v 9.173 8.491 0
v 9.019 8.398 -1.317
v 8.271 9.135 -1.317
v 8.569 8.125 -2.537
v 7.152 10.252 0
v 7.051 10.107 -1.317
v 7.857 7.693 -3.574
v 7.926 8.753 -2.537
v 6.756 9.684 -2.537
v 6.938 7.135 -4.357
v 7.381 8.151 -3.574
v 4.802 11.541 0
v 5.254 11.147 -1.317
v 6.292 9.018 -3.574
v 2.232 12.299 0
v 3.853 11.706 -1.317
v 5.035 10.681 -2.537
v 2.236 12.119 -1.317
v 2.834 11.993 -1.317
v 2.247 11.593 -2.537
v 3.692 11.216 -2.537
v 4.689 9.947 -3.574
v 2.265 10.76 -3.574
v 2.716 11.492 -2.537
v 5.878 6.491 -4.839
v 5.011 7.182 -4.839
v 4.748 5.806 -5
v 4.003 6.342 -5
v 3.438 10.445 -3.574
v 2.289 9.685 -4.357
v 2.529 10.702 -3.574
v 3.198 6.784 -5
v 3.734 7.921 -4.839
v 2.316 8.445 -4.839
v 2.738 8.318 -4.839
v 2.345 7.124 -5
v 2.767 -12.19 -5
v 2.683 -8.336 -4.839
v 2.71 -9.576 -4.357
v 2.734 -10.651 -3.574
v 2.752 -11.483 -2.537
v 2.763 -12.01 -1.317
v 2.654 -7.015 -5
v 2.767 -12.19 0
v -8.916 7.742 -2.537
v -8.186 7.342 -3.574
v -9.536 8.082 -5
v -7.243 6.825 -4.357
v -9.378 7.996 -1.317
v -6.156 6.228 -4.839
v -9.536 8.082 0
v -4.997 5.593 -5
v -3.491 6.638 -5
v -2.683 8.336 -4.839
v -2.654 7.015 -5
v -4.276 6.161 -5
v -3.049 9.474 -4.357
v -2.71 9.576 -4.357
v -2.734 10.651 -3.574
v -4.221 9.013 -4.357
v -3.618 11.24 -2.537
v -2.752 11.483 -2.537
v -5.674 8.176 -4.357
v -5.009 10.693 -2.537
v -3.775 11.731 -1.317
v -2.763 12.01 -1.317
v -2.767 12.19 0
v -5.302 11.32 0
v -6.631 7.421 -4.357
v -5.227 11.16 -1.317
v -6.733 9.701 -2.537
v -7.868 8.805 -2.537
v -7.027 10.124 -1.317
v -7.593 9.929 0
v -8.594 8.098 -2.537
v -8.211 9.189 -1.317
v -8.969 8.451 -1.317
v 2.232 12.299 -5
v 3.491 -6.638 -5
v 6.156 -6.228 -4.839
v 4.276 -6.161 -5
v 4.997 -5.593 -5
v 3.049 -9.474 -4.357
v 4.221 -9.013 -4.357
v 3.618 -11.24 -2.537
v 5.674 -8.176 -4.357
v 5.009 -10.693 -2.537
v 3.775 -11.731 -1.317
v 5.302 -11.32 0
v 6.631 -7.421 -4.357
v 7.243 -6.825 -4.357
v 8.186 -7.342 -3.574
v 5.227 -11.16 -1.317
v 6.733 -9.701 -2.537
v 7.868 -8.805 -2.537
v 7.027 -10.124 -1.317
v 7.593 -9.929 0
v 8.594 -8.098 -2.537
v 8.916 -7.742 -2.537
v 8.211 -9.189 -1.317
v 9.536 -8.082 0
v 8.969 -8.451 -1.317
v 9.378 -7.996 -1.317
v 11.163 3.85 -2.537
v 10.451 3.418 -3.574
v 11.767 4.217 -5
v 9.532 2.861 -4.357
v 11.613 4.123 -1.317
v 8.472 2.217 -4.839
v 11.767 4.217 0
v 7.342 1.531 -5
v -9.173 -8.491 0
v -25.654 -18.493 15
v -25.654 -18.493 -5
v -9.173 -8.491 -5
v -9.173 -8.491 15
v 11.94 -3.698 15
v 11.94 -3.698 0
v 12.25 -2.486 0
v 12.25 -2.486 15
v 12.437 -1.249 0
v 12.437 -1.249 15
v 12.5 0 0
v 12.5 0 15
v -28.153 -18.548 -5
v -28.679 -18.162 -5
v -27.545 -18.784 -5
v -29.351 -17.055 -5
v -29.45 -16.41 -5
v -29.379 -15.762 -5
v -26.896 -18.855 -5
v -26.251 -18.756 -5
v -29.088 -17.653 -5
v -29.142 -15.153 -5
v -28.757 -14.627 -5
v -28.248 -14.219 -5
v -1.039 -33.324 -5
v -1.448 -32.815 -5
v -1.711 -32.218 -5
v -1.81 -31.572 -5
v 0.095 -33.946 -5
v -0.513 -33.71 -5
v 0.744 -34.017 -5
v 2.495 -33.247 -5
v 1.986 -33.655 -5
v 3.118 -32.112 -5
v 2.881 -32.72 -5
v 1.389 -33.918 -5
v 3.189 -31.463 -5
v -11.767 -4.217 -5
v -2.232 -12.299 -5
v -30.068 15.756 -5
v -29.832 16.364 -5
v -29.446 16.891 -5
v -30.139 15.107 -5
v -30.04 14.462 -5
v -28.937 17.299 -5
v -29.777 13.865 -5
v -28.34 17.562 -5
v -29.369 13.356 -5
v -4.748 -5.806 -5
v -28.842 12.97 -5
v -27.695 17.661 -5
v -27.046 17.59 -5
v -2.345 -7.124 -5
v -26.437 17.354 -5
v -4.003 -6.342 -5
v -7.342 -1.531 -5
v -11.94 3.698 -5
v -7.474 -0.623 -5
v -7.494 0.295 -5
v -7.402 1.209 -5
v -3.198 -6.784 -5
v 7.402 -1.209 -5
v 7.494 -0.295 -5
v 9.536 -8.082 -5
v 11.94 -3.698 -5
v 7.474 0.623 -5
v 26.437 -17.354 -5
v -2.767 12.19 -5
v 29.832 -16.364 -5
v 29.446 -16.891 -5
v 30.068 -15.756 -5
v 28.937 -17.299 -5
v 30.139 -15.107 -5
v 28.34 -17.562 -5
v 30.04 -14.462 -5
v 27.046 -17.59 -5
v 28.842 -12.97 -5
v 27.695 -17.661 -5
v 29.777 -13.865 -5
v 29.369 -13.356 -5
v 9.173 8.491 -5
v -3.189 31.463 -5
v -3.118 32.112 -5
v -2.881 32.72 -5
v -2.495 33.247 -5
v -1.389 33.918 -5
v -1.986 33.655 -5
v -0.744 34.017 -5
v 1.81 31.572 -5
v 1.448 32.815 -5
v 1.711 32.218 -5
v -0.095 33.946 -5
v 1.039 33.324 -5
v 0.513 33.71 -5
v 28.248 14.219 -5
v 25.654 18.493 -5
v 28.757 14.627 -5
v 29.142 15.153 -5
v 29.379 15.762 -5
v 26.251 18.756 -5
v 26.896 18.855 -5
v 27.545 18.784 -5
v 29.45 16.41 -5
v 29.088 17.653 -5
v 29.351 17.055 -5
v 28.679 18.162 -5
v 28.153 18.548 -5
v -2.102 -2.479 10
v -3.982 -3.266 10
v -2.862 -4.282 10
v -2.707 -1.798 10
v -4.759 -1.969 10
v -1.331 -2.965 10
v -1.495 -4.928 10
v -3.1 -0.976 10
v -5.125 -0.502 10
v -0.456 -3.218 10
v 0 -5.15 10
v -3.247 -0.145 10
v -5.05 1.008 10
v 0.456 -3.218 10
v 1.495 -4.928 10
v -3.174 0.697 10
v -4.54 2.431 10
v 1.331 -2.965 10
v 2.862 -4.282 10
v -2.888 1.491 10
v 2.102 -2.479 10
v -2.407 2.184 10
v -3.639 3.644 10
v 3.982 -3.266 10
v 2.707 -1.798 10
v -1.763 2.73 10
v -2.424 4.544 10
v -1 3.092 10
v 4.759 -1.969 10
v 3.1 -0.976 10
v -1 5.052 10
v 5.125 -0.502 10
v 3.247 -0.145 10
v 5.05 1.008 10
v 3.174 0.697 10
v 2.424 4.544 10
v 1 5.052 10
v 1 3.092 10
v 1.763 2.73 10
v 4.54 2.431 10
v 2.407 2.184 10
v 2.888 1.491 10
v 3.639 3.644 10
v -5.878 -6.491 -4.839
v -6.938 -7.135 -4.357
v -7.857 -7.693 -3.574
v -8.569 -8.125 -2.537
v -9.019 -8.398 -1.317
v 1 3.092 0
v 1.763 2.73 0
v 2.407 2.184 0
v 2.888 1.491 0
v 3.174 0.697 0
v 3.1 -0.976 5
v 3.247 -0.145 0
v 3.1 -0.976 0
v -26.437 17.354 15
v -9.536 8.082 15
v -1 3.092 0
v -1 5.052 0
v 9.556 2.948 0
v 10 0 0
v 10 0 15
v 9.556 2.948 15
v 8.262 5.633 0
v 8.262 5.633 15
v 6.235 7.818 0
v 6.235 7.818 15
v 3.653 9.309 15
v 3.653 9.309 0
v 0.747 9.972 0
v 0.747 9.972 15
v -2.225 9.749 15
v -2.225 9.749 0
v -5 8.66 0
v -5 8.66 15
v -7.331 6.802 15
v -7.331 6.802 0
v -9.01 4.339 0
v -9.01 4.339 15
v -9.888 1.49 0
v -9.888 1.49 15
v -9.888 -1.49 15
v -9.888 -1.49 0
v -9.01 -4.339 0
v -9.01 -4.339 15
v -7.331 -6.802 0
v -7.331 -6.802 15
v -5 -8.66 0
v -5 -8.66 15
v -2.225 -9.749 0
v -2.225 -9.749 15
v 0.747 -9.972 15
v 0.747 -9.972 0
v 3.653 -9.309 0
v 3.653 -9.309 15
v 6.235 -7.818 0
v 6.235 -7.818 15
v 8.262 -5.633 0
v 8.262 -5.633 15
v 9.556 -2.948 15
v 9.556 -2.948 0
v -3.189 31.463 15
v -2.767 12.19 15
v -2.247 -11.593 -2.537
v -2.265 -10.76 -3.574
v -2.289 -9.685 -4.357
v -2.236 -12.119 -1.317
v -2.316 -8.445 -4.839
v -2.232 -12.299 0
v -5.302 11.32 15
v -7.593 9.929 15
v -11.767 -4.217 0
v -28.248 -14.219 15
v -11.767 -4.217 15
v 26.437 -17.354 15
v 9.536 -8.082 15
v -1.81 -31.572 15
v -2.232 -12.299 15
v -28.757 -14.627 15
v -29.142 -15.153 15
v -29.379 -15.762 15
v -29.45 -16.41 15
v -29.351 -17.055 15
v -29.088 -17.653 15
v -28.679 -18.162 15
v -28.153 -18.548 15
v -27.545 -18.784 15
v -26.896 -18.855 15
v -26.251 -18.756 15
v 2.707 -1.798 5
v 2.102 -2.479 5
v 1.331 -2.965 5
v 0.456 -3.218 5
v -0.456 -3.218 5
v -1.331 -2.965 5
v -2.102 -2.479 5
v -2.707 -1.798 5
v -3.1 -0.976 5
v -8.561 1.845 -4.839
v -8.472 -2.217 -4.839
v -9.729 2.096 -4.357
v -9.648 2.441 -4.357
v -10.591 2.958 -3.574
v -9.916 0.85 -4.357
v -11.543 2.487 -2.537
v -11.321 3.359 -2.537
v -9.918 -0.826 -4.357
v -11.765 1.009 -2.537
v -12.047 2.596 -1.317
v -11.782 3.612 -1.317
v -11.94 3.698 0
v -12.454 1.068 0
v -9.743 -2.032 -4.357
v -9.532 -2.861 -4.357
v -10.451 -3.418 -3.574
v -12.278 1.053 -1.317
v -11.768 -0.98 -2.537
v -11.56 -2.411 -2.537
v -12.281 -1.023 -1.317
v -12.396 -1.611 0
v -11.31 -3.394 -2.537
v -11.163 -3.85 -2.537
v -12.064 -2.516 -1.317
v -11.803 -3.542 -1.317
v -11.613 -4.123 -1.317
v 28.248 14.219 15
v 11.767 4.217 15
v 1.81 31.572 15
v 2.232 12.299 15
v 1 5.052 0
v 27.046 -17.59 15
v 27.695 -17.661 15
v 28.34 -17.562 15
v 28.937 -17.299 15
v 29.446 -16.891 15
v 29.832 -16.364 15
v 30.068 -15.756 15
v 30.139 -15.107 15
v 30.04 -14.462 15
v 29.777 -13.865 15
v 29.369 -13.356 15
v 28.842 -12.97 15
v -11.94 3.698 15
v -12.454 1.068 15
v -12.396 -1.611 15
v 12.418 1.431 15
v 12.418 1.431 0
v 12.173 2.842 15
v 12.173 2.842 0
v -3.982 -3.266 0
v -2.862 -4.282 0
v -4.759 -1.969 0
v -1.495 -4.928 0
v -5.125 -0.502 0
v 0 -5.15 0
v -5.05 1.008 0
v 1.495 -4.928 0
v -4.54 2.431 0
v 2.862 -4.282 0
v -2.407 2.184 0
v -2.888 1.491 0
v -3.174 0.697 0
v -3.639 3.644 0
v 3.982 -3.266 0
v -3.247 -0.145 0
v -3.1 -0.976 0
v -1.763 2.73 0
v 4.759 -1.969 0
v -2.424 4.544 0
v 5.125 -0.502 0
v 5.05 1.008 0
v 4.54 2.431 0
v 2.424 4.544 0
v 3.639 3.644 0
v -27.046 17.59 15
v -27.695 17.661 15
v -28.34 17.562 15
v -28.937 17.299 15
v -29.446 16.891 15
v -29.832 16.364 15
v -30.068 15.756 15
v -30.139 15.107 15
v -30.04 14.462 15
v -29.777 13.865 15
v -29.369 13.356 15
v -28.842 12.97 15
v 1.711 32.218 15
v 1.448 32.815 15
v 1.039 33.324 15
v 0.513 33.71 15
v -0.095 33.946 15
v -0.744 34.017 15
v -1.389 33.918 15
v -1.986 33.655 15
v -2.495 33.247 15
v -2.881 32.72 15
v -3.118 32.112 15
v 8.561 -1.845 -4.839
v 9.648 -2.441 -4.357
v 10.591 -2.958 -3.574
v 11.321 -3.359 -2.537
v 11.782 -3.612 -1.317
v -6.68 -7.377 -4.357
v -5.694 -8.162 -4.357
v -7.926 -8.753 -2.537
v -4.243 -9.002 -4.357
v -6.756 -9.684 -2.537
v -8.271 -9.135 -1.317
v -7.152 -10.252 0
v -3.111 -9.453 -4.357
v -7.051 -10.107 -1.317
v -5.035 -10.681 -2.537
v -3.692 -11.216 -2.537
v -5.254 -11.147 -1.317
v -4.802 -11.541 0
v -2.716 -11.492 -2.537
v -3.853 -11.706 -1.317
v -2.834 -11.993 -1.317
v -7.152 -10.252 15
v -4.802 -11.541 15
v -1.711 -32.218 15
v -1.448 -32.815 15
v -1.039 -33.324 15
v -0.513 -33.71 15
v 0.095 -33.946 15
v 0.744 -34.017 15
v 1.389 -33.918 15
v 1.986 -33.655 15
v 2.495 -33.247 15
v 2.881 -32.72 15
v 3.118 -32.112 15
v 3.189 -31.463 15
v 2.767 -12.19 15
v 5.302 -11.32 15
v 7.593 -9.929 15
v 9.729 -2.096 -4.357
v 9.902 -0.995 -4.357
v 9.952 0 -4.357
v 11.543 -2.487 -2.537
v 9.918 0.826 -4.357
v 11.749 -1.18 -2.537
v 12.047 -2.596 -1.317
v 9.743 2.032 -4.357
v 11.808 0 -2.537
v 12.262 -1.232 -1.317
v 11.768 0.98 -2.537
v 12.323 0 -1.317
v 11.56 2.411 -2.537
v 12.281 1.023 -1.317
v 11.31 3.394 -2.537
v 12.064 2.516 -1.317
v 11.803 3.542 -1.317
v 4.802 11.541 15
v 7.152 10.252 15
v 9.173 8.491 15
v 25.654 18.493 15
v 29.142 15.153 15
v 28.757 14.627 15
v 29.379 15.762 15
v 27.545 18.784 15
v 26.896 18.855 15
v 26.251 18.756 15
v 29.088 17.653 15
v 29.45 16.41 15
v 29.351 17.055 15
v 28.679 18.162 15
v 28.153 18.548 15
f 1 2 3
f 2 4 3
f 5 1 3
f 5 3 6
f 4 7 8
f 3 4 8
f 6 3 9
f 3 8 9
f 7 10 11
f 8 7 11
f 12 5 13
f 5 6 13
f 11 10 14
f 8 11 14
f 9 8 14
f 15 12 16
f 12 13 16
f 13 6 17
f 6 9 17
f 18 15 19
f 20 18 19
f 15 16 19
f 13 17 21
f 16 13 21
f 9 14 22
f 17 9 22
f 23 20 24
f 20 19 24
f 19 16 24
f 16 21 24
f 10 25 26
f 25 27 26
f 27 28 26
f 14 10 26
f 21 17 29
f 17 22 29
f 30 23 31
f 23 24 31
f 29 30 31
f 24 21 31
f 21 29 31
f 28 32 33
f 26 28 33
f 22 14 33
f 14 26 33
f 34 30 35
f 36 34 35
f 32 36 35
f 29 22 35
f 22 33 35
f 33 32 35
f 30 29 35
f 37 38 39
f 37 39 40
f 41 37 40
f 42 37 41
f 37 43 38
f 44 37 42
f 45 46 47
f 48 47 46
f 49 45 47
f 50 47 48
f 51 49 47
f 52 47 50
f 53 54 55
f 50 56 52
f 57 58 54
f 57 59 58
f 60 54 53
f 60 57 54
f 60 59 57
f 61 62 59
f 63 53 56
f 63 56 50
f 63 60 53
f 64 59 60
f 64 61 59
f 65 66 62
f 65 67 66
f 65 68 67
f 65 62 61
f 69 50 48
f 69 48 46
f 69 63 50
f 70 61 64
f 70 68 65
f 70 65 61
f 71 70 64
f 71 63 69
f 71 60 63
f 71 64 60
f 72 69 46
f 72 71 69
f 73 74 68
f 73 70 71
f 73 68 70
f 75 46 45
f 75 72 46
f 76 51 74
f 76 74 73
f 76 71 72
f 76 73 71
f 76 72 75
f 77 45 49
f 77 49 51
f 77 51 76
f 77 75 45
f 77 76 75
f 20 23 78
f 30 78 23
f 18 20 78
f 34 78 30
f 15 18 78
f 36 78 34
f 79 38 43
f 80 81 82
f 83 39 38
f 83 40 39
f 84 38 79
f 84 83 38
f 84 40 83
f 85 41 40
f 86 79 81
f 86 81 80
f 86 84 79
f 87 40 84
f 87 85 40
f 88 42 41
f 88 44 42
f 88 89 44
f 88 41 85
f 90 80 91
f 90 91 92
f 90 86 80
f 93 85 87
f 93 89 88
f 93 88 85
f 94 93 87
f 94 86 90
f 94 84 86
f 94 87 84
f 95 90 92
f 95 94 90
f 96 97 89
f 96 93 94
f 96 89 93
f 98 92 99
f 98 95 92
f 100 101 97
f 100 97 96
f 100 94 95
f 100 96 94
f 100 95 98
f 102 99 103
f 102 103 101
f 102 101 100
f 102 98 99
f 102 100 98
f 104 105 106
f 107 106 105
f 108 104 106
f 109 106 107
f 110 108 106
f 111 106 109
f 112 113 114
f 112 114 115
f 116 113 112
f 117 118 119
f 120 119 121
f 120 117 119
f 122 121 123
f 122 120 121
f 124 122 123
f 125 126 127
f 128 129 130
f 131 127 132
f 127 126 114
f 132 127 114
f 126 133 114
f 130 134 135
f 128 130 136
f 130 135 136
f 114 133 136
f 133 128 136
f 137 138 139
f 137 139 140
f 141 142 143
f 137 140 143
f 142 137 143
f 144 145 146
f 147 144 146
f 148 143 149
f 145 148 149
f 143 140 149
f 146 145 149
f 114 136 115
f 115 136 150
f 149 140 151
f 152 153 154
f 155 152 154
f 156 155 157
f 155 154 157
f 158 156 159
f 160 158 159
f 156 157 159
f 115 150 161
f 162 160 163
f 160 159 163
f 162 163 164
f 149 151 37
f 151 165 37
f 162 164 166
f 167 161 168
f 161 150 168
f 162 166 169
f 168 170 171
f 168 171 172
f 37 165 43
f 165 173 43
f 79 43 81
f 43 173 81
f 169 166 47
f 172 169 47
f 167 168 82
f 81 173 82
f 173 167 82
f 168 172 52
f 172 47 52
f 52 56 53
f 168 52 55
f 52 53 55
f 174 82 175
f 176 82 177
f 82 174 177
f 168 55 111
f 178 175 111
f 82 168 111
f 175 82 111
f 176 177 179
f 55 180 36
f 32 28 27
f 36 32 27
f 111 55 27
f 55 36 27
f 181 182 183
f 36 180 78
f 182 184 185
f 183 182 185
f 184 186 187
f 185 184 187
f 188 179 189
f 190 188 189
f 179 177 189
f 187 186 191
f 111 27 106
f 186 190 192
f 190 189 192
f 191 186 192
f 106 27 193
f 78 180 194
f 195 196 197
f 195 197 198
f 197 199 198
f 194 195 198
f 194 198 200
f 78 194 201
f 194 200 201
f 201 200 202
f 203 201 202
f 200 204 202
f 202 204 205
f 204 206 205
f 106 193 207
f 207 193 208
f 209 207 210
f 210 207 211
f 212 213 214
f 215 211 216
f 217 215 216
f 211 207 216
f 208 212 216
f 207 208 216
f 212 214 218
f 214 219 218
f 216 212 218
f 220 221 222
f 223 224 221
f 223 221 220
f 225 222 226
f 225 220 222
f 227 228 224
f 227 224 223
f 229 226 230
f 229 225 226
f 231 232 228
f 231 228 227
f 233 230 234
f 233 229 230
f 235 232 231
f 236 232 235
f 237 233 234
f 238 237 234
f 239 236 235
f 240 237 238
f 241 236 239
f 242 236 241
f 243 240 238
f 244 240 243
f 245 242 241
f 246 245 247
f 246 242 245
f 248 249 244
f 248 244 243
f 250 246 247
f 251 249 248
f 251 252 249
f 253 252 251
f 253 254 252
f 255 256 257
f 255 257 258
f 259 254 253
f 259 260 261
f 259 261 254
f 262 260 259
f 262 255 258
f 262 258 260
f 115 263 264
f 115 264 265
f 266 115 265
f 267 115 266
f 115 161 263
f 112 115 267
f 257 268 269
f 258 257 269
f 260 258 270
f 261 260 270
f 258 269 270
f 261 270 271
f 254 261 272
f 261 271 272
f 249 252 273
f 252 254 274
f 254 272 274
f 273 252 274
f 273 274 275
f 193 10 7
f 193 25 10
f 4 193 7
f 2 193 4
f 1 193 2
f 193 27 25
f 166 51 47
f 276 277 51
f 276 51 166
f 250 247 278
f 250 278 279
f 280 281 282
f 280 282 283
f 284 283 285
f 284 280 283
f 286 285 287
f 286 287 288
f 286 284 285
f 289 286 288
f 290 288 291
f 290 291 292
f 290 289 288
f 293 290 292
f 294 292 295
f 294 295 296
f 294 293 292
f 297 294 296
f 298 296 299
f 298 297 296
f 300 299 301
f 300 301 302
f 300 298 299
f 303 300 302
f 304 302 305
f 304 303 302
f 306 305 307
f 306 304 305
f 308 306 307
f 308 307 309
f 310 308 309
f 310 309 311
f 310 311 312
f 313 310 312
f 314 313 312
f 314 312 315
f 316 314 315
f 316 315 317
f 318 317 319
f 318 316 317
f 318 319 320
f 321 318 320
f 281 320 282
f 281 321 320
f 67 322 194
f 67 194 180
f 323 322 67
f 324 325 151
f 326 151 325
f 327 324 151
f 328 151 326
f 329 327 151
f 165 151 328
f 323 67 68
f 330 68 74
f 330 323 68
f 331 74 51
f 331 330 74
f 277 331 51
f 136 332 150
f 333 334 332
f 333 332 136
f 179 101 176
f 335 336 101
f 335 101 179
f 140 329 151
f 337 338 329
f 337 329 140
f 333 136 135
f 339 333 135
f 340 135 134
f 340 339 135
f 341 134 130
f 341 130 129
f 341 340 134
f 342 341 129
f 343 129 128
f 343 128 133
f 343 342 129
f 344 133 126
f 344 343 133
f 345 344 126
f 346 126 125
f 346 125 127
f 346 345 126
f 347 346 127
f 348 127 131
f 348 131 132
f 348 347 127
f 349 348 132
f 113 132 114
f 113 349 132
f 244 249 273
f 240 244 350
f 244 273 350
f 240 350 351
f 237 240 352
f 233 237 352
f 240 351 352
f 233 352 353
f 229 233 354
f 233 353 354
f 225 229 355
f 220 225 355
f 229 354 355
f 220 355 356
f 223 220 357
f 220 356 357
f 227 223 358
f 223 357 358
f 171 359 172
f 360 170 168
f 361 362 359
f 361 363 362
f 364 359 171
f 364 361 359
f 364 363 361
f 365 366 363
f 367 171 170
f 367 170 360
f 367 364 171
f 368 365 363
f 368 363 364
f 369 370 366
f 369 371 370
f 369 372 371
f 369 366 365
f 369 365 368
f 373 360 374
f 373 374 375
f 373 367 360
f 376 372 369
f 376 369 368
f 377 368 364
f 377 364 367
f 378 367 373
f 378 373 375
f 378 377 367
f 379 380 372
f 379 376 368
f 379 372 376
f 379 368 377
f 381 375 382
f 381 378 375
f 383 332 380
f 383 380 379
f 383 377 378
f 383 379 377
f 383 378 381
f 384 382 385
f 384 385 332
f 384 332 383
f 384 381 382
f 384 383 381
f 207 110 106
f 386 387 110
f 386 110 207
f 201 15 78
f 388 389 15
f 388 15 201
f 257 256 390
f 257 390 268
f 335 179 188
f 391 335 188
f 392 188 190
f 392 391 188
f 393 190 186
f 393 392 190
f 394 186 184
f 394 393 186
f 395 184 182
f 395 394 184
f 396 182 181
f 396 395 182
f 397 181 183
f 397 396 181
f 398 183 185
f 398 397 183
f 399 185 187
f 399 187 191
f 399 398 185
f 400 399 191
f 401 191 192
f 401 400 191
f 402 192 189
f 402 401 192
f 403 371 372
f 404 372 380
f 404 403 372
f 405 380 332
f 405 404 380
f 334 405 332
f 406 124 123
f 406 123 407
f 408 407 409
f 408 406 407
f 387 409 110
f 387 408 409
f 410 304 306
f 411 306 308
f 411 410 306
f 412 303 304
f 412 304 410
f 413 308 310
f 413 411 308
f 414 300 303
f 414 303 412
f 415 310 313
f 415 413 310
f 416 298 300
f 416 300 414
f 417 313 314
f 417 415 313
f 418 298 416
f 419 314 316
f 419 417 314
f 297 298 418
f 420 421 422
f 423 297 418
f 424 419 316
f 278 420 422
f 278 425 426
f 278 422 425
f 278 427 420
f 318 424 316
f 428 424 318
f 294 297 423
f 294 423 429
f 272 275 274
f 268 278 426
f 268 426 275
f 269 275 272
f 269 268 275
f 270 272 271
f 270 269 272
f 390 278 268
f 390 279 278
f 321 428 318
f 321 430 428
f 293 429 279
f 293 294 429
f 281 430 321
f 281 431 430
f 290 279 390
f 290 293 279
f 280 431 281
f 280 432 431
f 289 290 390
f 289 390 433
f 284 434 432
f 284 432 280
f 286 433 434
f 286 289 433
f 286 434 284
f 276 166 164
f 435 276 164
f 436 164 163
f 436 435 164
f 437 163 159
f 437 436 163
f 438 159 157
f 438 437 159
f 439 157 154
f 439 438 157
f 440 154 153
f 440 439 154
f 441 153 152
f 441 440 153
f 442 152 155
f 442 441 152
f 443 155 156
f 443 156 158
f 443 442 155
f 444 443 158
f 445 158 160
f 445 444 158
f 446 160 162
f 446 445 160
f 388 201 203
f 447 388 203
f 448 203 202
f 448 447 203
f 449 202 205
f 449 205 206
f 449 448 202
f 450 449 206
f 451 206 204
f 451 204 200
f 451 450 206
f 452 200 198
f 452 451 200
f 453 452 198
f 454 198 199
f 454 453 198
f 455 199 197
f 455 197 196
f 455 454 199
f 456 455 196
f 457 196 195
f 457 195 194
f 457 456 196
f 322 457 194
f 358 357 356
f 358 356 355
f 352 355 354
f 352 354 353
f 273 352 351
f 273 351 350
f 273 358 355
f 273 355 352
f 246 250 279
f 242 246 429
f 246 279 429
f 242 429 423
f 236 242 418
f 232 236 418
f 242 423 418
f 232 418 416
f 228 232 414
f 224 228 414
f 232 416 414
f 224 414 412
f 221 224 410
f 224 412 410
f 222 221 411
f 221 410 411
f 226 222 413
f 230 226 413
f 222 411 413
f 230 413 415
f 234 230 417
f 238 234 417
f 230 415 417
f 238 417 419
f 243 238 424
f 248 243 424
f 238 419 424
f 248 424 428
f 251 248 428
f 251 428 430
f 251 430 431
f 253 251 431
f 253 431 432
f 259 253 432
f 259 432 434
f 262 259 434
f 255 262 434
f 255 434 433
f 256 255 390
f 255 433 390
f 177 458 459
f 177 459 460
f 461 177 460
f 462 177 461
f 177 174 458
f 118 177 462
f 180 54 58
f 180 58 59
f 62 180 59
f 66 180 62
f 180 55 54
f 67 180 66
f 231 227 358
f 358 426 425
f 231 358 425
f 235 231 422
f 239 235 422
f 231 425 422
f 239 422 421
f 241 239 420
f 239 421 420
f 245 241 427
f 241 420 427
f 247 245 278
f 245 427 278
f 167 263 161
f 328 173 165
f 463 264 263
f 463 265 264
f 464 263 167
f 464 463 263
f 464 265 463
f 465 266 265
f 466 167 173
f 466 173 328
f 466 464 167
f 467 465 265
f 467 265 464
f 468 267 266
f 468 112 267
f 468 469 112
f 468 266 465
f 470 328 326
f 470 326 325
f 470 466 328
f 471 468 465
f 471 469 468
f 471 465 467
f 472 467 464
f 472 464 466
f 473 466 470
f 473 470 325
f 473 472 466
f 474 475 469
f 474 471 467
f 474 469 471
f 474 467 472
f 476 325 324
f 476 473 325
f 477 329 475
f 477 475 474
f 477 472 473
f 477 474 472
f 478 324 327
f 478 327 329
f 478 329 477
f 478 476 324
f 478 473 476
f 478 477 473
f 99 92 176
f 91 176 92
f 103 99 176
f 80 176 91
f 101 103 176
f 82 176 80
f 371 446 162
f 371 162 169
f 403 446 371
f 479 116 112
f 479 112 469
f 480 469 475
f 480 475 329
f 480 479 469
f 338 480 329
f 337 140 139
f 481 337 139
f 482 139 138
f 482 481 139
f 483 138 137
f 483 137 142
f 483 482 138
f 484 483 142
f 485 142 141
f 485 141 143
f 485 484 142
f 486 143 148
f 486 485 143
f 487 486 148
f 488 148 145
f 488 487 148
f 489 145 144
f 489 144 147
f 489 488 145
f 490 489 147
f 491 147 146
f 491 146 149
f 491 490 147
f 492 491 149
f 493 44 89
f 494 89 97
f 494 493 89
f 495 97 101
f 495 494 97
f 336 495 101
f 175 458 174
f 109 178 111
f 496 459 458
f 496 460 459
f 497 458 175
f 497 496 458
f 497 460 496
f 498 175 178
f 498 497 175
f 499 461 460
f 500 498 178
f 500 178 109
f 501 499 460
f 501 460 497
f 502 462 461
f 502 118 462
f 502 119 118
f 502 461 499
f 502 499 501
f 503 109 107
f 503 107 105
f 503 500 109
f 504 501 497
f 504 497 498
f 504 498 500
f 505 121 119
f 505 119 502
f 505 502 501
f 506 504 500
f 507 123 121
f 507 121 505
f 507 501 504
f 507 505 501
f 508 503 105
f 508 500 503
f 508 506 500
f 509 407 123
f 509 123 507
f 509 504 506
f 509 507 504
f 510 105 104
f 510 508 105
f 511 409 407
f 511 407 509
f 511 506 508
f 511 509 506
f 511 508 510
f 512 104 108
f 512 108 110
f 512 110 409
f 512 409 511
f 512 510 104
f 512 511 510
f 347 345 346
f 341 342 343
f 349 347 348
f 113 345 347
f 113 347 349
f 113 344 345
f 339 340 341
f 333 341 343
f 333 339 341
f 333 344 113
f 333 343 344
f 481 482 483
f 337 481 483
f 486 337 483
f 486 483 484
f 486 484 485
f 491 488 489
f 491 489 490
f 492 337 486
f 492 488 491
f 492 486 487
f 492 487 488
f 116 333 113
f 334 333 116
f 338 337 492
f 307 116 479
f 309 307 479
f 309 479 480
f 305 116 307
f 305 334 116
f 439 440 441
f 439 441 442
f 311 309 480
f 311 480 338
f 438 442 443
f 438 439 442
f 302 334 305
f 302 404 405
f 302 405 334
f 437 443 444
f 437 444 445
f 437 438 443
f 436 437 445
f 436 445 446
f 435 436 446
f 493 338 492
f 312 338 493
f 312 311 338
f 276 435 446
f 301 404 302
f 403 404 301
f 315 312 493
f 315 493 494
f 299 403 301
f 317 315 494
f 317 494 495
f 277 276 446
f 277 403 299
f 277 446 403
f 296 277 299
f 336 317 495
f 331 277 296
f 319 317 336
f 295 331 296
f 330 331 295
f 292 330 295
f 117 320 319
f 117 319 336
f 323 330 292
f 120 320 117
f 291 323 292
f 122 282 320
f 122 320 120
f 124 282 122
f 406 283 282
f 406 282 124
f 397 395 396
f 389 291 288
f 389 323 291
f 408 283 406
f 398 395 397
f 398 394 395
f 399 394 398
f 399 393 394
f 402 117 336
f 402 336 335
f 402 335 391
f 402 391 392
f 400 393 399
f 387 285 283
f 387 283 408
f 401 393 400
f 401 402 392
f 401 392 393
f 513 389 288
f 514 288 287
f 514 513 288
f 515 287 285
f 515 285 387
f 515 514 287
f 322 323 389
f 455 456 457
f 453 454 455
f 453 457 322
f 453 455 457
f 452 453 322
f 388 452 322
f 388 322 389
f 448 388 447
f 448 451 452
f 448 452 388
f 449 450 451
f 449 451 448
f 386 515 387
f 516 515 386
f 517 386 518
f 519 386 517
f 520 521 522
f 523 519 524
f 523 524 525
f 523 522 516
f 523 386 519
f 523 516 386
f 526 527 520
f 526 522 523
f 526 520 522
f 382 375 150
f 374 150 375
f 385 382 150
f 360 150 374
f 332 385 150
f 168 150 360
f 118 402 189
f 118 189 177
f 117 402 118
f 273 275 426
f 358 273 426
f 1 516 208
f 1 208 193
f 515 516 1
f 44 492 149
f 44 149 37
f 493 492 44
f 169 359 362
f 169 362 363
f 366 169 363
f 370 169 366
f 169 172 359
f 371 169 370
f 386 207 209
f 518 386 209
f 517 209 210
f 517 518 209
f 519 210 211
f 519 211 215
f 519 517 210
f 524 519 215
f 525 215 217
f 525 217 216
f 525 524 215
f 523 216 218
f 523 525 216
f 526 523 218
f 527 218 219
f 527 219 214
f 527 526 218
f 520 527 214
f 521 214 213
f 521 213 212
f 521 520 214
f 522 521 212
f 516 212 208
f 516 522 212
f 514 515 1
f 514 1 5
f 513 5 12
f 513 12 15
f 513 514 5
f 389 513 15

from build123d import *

# Parameters (mm, degrees)
F1_DEPTH     = 10
F2_DEPTH     = 5
F0_R         = 10
F3_DEPTH     = 15
F4_DEPTH     = 5
F6_T4_ANGLE  = 151.525388132
F6_T10_ANGLE = 151.525388132
F6_T16_ANGLE = 151.525388132
F6_T22_ANGLE = 151.525388132
F6_T28_ANGLE = 151.525388132
F6_T34_ANGLE = 151.525388132


# Not quite as in the source:
# - a fillet or chamfer that OpenCascade refuses, or shapes differently, is made with other operations: its cross-section is extruded or revolved along the edge and cut away or added
# - a feature of the source that left no trace in its solid (it failed there, or was rolled back) is left out


with BuildPart() as f1:
    # F0 (on Top) → F1 (new body)
    with BuildSketch(Plane.XY):
        with BuildLine():
            ThreePointArc((-3.1, -0.9759610648), (-2.8879484862, 1.4907224897), (-1, 3.0923292192))
            Line((-1, 3.0923292192), (-1, 5.0519798099))
            ThreePointArc((-1, 5.0519798099), (0, -5.15), (1, 5.0519798099))
            Line((1, 5.0519798099), (1, 3.0923292192))
            ThreePointArc((1, 3.0923292192), (2.8879484862, 1.4907224897), (3.1, -0.9759610648))
            ThreePointArc((3.1, -0.9759610648), (0, -3.25), (-3.1, -0.9759610648))
        make_face()
    extrude(amount=F1_DEPTH)

    # F0 (on Top) → F2 (join)
    with BuildSketch(Plane.XY):
        with BuildLine():
            Line((3.1, -0.9759610648), (-3.1, -0.9759610648))
            ThreePointArc((-3.1, -0.9759610648), (0, -3.25), (3.1, -0.9759610648))
        make_face()
    extrude(amount=F2_DEPTH)



with BuildPart() as f3:
    # F0 (on Top) → F3 (new body)
    with BuildSketch(Plane.XY):
        with BuildLine():
            ThreePointArc((11.940314229, -3.6984991703), (12.3592865462, -1.870303737), (12.5, 0))
            ThreePointArc((12.5, 0), (12.3154429017, 2.1400621802), (11.7672214184, 4.2169301738))
            ThreePointArc((11.7672214184, 4.2169301738), (10.6860892314, 6.4851751664), (9.1731513519, 8.4913658663))
            ThreePointArc((9.1731513519, 8.4913658663), (6.0118371583, 10.9593710578), (2.2316420527, 12.2991777672))
            ThreePointArc((2.2316420527, 12.2991777672), (-0.2732818264, 12.4970123247), (-2.7671628772, 12.1898650366))
            ThreePointArc((-2.7671628772, 12.1898650366), (-6.4851751664, 10.6860892314), (-9.5355793657, 8.0822475934))
            ThreePointArc((-9.5355793657, 8.0822475934), (-10.9593710578, 6.0118371583), (-11.940314229, 3.6984991703))
            ThreePointArc((-11.940314229, 3.6984991703), (-12.4970123247, -0.2732818264), (-11.7672214184, -4.2169301738))
            ThreePointArc((-11.7672214184, -4.2169301738), (-10.6860892314, -6.4851751664), (-9.1731513519, -8.4913658663))
            ThreePointArc((-9.1731513519, -8.4913658663), (-6.0118371583, -10.9593710578), (-2.2316420527, -12.2991777672))
            ThreePointArc((-2.2316420527, -12.2991777672), (0.2732818264, -12.4970123247), (2.7671628772, -12.1898650366))
            ThreePointArc((2.7671628772, -12.1898650366), (6.4851751664, -10.6860892314), (9.5355793657, -8.0822475934))
            ThreePointArc((9.5355793657, -8.0822475934), (10.9593710578, -6.0118371583), (11.940314229, -3.6984991703))
        make_face()
        Circle(F0_R, mode=Mode.SUBTRACT)
        with BuildLine():
            ThreePointArc((9.1731513519, 8.4913658663), (10.6860892314, 6.4851751664), (11.7672214184, 4.2169301738))
            Line((11.7672214184, 4.2169301738), (28.2476592825, 14.2185803615))
            ThreePointArc((28.2476592825, 14.2185803615), (29.3790077487, 15.7616992433), (29.0878420955, 17.652833241))
            ThreePointArc((29.0878420955, 17.652833241), (27.5447232138, 18.7841817072), (25.653589216, 18.4930160541))
            Line((25.653589216, 18.4930160541), (9.1731513519, 8.4913658663))
        make_face()
        with BuildLine():
            ThreePointArc((-2.7671628772, 12.1898650366), (-0.2732818264, 12.4970123247), (2.2316420527, 12.2991777672))
            Line((2.2316420527, 12.2991777672), (1.8101778425, 31.5724807169))
            ThreePointArc((1.8101778425, 31.5724807169), (1.0394719229, 33.32381667), (-0.7438809877, 34.0172268165))
            ThreePointArc((-0.7438809877, 34.0172268165), (-2.4952169409, 33.246520897), (-3.1886270874, 31.4631679863))
            Line((-3.1886270874, 31.4631679863), (-2.7671628772, 12.1898650366))
        make_face()
        with BuildLine():
            ThreePointArc((-11.940314229, 3.6984991703), (-10.9593710578, 6.0118371583), (-9.5355793657, 8.0822475934))
            Line((-9.5355793657, 8.0822475934), (-26.4374814401, 17.3539003554))
            ThreePointArc((-26.4374814401, 17.3539003554), (-28.3395358258, 17.5621174267), (-29.8317230833, 16.3643935755))
            ThreePointArc((-29.8317230833, 16.3643935755), (-30.0399401546, 14.4623391897), (-28.8422163034, 12.9701519323))
            Line((-28.8422163034, 12.9701519323), (-11.940314229, 3.6984991703))
        make_face()
        with BuildLine():
            Line((-25.653589216, -18.4930160541), (-9.1731513519, -8.4913658663))
            ThreePointArc((-9.1731513519, -8.4913658663), (-10.6860892314, -6.4851751664), (-11.7672214184, -4.2169301738))
            Line((-11.7672214184, -4.2169301738), (-28.2476592825, -14.2185803615))
            ThreePointArc((-28.2476592825, -14.2185803615), (-29.3790077487, -15.7616992433), (-29.0878420955, -17.652833241))
            ThreePointArc((-29.0878420955, -17.652833241), (-27.5447232138, -18.7841817072), (-25.653589216, -18.4930160541))
        make_face()
        with BuildLine():
            Line((3.1886270874, -31.4631679863), (2.7671628772, -12.1898650366))
            ThreePointArc((2.7671628772, -12.1898650366), (0.2732818264, -12.4970123247), (-2.2316420527, -12.2991777672))
            Line((-2.2316420527, -12.2991777672), (-1.8101778425, -31.5724807169))
            ThreePointArc((-1.8101778425, -31.5724807169), (-1.0394719229, -33.32381667), (0.7438809877, -34.0172268165))
            ThreePointArc((0.7438809877, -34.0172268165), (2.4952169409, -33.246520897), (3.1886270874, -31.4631679863))
        make_face()
        with BuildLine():
            Line((28.8422163034, -12.9701519323), (11.940314229, -3.6984991703))
            ThreePointArc((11.940314229, -3.6984991703), (10.9593710578, -6.0118371583), (9.5355793657, -8.0822475934))
            Line((9.5355793657, -8.0822475934), (26.4374814401, -17.3539003554))
            ThreePointArc((26.4374814401, -17.3539003554), (28.3395358258, -17.5621174267), (29.8317230833, -16.3643935755))
            ThreePointArc((29.8317230833, -16.3643935755), (30.0399401546, -14.4623391897), (28.8422163034, -12.9701519323))
        make_face()
    extrude(amount=F3_DEPTH)


with BuildPart() as f1_1:
    add(f1.part)

    add(f3.part)  # F4 merges F3
    # F0 (on Top) → F4 (join)
    with BuildSketch(Plane.XY):
        with BuildLine():
            ThreePointArc((11.940314229, -3.6984991703), (12.3592865462, -1.870303737), (12.5, 0))
            ThreePointArc((12.5, 0), (12.3154429017, 2.1400621802), (11.7672214184, 4.2169301738))
            ThreePointArc((11.7672214184, 4.2169301738), (10.6860892314, 6.4851751664), (9.1731513519, 8.4913658663))
            ThreePointArc((9.1731513519, 8.4913658663), (6.0118371583, 10.9593710578), (2.2316420527, 12.2991777672))
            ThreePointArc((2.2316420527, 12.2991777672), (-0.2732818264, 12.4970123247), (-2.7671628772, 12.1898650366))
            ThreePointArc((-2.7671628772, 12.1898650366), (-6.4851751664, 10.6860892314), (-9.5355793657, 8.0822475934))
            ThreePointArc((-9.5355793657, 8.0822475934), (-10.9593710578, 6.0118371583), (-11.940314229, 3.6984991703))
            ThreePointArc((-11.940314229, 3.6984991703), (-12.4970123247, -0.2732818264), (-11.7672214184, -4.2169301738))
            ThreePointArc((-11.7672214184, -4.2169301738), (-10.6860892314, -6.4851751664), (-9.1731513519, -8.4913658663))
            ThreePointArc((-9.1731513519, -8.4913658663), (-6.0118371583, -10.9593710578), (-2.2316420527, -12.2991777672))
            ThreePointArc((-2.2316420527, -12.2991777672), (0.2732818264, -12.4970123247), (2.7671628772, -12.1898650366))
            ThreePointArc((2.7671628772, -12.1898650366), (6.4851751664, -10.6860892314), (9.5355793657, -8.0822475934))
            ThreePointArc((9.5355793657, -8.0822475934), (10.9593710578, -6.0118371583), (11.940314229, -3.6984991703))
        make_face()
        Circle(F0_R, mode=Mode.SUBTRACT)
        with BuildLine():
            ThreePointArc((9.1731513519, 8.4913658663), (10.6860892314, 6.4851751664), (11.7672214184, 4.2169301738))
            Line((11.7672214184, 4.2169301738), (28.2476592825, 14.2185803615))
            ThreePointArc((28.2476592825, 14.2185803615), (29.3790077487, 15.7616992433), (29.0878420955, 17.652833241))
            ThreePointArc((29.0878420955, 17.652833241), (27.5447232138, 18.7841817072), (25.653589216, 18.4930160541))
            Line((25.653589216, 18.4930160541), (9.1731513519, 8.4913658663))
        make_face()
        with BuildLine():
            Line((28.8422163034, -12.9701519323), (11.940314229, -3.6984991703))
            ThreePointArc((11.940314229, -3.6984991703), (10.9593710578, -6.0118371583), (9.5355793657, -8.0822475934))
            Line((9.5355793657, -8.0822475934), (26.4374814401, -17.3539003554))
            ThreePointArc((26.4374814401, -17.3539003554), (28.3395358258, -17.5621174267), (29.8317230833, -16.3643935755))
            ThreePointArc((29.8317230833, -16.3643935755), (30.0399401546, -14.4623391897), (28.8422163034, -12.9701519323))
        make_face()
        with BuildLine():
            ThreePointArc((-2.7671628772, 12.1898650366), (-0.2732818264, 12.4970123247), (2.2316420527, 12.2991777672))
            Line((2.2316420527, 12.2991777672), (1.8101778425, 31.5724807169))
            ThreePointArc((1.8101778425, 31.5724807169), (1.0394719229, 33.32381667), (-0.7438809877, 34.0172268165))
            ThreePointArc((-0.7438809877, 34.0172268165), (-2.4952169409, 33.246520897), (-3.1886270874, 31.4631679863))
            Line((-3.1886270874, 31.4631679863), (-2.7671628772, 12.1898650366))
        make_face()
        with BuildLine():
            Line((3.1886270874, -31.4631679863), (2.7671628772, -12.1898650366))
            ThreePointArc((2.7671628772, -12.1898650366), (0.2732818264, -12.4970123247), (-2.2316420527, -12.2991777672))
            Line((-2.2316420527, -12.2991777672), (-1.8101778425, -31.5724807169))
            ThreePointArc((-1.8101778425, -31.5724807169), (-1.0394719229, -33.32381667), (0.7438809877, -34.0172268165))
            ThreePointArc((0.7438809877, -34.0172268165), (2.4952169409, -33.246520897), (3.1886270874, -31.4631679863))
        make_face()
        with BuildLine():
            ThreePointArc((-11.940314229, 3.6984991703), (-10.9593710578, 6.0118371583), (-9.5355793657, 8.0822475934))
            Line((-9.5355793657, 8.0822475934), (-26.4374814401, 17.3539003554))
            ThreePointArc((-26.4374814401, 17.3539003554), (-28.3395358258, 17.5621174267), (-29.8317230833, 16.3643935755))
            ThreePointArc((-29.8317230833, 16.3643935755), (-30.0399401546, 14.4623391897), (-28.8422163034, 12.9701519323))
            Line((-28.8422163034, 12.9701519323), (-11.940314229, 3.6984991703))
        make_face()
        with BuildLine():
            Line((-25.653589216, -18.4930160541), (-9.1731513519, -8.4913658663))
            ThreePointArc((-9.1731513519, -8.4913658663), (-10.6860892314, -6.4851751664), (-11.7672214184, -4.2169301738))
            Line((-11.7672214184, -4.2169301738), (-28.2476592825, -14.2185803615))
            ThreePointArc((-28.2476592825, -14.2185803615), (-29.3790077487, -15.7616992433), (-29.0878420955, -17.652833241))
            ThreePointArc((-29.0878420955, -17.652833241), (-27.5447232138, -18.7841817072), (-25.653589216, -18.4930160541))
        make_face()
        Circle(F0_R)
        with BuildLine():
            Line((-1, 5.0519798099), (-1, 3.0923292192))
            ThreePointArc((-1, 3.0923292192), (-2.8879484862, 1.4907224897), (-3.1, -0.9759610648))
            Line((-3.1, -0.9759610648), (3.1, -0.9759610648))
            ThreePointArc((3.1, -0.9759610648), (2.8879484862, 1.4907224897), (1, 3.0923292192))
            Line((1, 3.0923292192), (1, 5.0519798099))
            ThreePointArc((1, 5.0519798099), (0, -5.15), (-1, 5.0519798099))
        make_face(mode=Mode.SUBTRACT)
        with BuildLine():
            Line((3.1, -0.9759610648), (-3.1, -0.9759610648))
            ThreePointArc((-3.1, -0.9759610648), (0, -3.25), (3.1, -0.9759610648))
        make_face()
        with BuildLine():
            ThreePointArc((-3.1, -0.9759610648), (-2.8879484862, 1.4907224897), (-1, 3.0923292192))
            Line((-1, 3.0923292192), (-1, 5.0519798099))
            ThreePointArc((-1, 5.0519798099), (0, -5.15), (1, 5.0519798099))
            Line((1, 5.0519798099), (1, 3.0923292192))
            ThreePointArc((1, 3.0923292192), (2.8879484862, 1.4907224897), (3.1, -0.9759610648))
            ThreePointArc((3.1, -0.9759610648), (0, -3.25), (-3.1, -0.9759610648))
        make_face()
    extrude(amount=-F4_DEPTH)

    # F6: fillet of radius 5 on 6 edges, made by hand


with BuildPart() as f6_tool2:
    # F6_s3 → F6_t4 (revolve)
    with BuildSketch(Plane(origin=(0, 0, 0), x_dir=(0, 0, 1), z_dir=(0.9636769063, 0.2670708152, 0))):
        with BuildLine():
            ThreePointArc((-5, -7.5), (-3.5355339059, -11.0355339059), (0, -12.5))
            Line((0, -12.5), (0, -12.6))
            Line((0, -12.6), (-5.1, -12.6))
            Line((-5.1, -12.6), (-5.1, -7.5))
            Line((-5.1, -7.5), (-5, -7.5))
        make_face()
    revolve(axis=Axis((0, 0, -5), (0, 0, 1)), revolution_arc=F6_T4_ANGLE)

    split(bisect_by=Plane(origin=(-1.2023674317, -2.1918742116, 0), x_dir=(0, 0, 1), z_dir=(-0.4809469727, -0.8767496846, 0)), keep=Keep.TOP)

    split(bisect_by=Plane(origin=(-1.2970350333, 2.1372178463, 0), x_dir=(0, 0, 1), z_dir=(-0.5188140133, 0.8548871385, 0)), keep=Keep.TOP)


with BuildPart() as f1_2:
    add(f1_1.part)

    # F6_t1: cut F6_tool2
    add(f6_tool2.part, mode=Mode.SUBTRACT)


with BuildPart() as f6_tool8:
    # F6_s9 → F6_t10 (revolve)
    with BuildSketch(Plane(origin=(0, 0, 0), x_dir=(0, 0, 1), z_dir=(-0.2505483426, -0.9681040895, 0))):
        with BuildLine():
            ThreePointArc((0, -12.5), (-3.5355339059, -11.0355339059), (-5, -7.5))
            Line((-5, -7.5), (-5.1, -7.5))
            Line((-5.1, -7.5), (-5.1, -12.6))
            Line((-5.1, -12.6), (0, -12.6))
            Line((0, -12.6), (0, -12.5))
        make_face()
    revolve(axis=Axis((0, 0, -5), (0, 0, 1)), revolution_arc=F6_T10_ANGLE)

    split(bisect_by=Plane(origin=(-1.2970350333, 2.1372178463, 0), x_dir=(0, 0, 1), z_dir=(-0.5188140133, 0.8548871385, 0)), keep=Keep.TOP)

    split(bisect_by=Plane(origin=(2.4994024649, 0.0546563653, 0), x_dir=(0, 0, 1), z_dir=(0.999760986, 0.0218625461, 0)), keep=Keep.TOP)


with BuildPart() as f1_3:
    add(f1_2.part)

    # F6_t7: cut F6_tool8
    add(f6_tool8.part, mode=Mode.SUBTRACT)


with BuildPart() as f6_tool14:
    # F6_s15 → F6_t16 (revolve)
    with BuildSketch(Plane(origin=(0, 0, 0), x_dir=(0, 0, 1), z_dir=(0.7131285637, -0.7010332743, 0))):
        with BuildLine():
            ThreePointArc((-5, -7.5), (-3.5355339059, -11.0355339059), (0, -12.5))
            Line((0, -12.5), (0, -12.6))
            Line((0, -12.6), (-5.1, -12.6))
            Line((-5.1, -12.6), (-5.1, -7.5))
            Line((-5.1, -7.5), (-5, -7.5))
        make_face()
    revolve(axis=Axis((0, 0, -5), (0, 0, 1)), revolution_arc=F6_T16_ANGLE)

    split(bisect_by=Plane(origin=(-2.4994024649, -0.0546563653, 0), x_dir=(0, 0, 1), z_dir=(-0.999760986, -0.0218625461, 0)), keep=Keep.TOP)

    split(bisect_by=Plane(origin=(1.2023674317, 2.1918742116, 0), x_dir=(0, 0, 1), z_dir=(0.4809469727, 0.8767496846, 0)), keep=Keep.TOP)


with BuildPart() as f1_4:
    add(f1_3.part)

    # F6_t13: cut F6_tool14
    add(f6_tool14.part, mode=Mode.SUBTRACT)


with BuildPart() as f6_tool20:
    # F6_s21 → F6_t22 (revolve)
    with BuildSketch(Plane(origin=(0, 0, 0), x_dir=(0, 0, 1), z_dir=(0.2505483426, 0.9681040895, 0))):
        with BuildLine():
            ThreePointArc((-5, -7.5), (-3.5355339059, -11.0355339059), (0, -12.5))
            Line((0, -12.5), (0, -12.6))
            Line((0, -12.6), (-5.1, -12.6))
            Line((-5.1, -12.6), (-5.1, -7.5))
            Line((-5.1, -7.5), (-5, -7.5))
        make_face()
    revolve(axis=Axis((0, 0, -5), (0, 0, 1)), revolution_arc=F6_T22_ANGLE)

    split(bisect_by=Plane(origin=(1.2970350333, -2.1372178463, 0), x_dir=(0, 0, 1), z_dir=(0.5188140133, -0.8548871385, 0)), keep=Keep.TOP)

    split(bisect_by=Plane(origin=(-2.4994024649, -0.0546563653, 0), x_dir=(0, 0, 1), z_dir=(-0.999760986, -0.0218625461, 0)), keep=Keep.TOP)


with BuildPart() as f1_5:
    add(f1_4.part)

    # F6_t19: cut F6_tool20
    add(f6_tool20.part, mode=Mode.SUBTRACT)


with BuildPart() as f6_tool26:
    # F6_s27 → F6_t28 (revolve)
    with BuildSketch(Plane(origin=(0, 0, 0), x_dir=(0, 0, 1), z_dir=(-0.7131285637, 0.7010332743, 0))):
        with BuildLine():
            ThreePointArc((-5, -7.5), (-3.5355339059, -11.0355339059), (0, -12.5))
            Line((0, -12.5), (0, -12.6))
            Line((0, -12.6), (-5.1, -12.6))
            Line((-5.1, -12.6), (-5.1, -7.5))
            Line((-5.1, -7.5), (-5, -7.5))
        make_face()
    revolve(axis=Axis((0, 0, -5), (0, 0, 1)), revolution_arc=F6_T28_ANGLE)

    split(bisect_by=Plane(origin=(2.4994024649, 0.0546563653, 0), x_dir=(0, 0, 1), z_dir=(0.999760986, 0.0218625461, 0)), keep=Keep.TOP)

    split(bisect_by=Plane(origin=(-1.2023674317, -2.1918742116, 0), x_dir=(0, 0, 1), z_dir=(-0.4809469727, -0.8767496846, 0)), keep=Keep.TOP)


with BuildPart() as f1_6:
    add(f1_5.part)

    # F6_t25: cut F6_tool26
    add(f6_tool26.part, mode=Mode.SUBTRACT)


with BuildPart() as f6_tool32:
    # F6_s33 → F6_t34 (revolve)
    with BuildSketch(Plane(origin=(0, 0, 0), x_dir=(0, 0, 1), z_dir=(-0.9636769063, -0.2670708152, 0))):
        with BuildLine():
            ThreePointArc((-5, -7.5), (-3.5355339059, -11.0355339059), (0, -12.5))
            Line((0, -12.5), (0, -12.6))
            Line((0, -12.6), (-5.1, -12.6))
            Line((-5.1, -12.6), (-5.1, -7.5))
            Line((-5.1, -7.5), (-5, -7.5))
        make_face()
    revolve(axis=Axis((0, 0, -5), (0, 0, 1)), revolution_arc=F6_T34_ANGLE)

    split(bisect_by=Plane(origin=(1.2023674317, 2.1918742116, 0), x_dir=(0, 0, 1), z_dir=(0.4809469727, 0.8767496846, 0)), keep=Keep.TOP)

    split(bisect_by=Plane(origin=(1.2970350333, -2.1372178463, 0), x_dir=(0, 0, 1), z_dir=(0.5188140133, -0.8548871385, 0)), keep=Keep.TOP)


with BuildPart() as f1_7:
    add(f1_6.part)

    # F6_t31: cut F6_tool32
    add(f6_tool32.part, mode=Mode.SUBTRACT)


solid = f1_7.part
